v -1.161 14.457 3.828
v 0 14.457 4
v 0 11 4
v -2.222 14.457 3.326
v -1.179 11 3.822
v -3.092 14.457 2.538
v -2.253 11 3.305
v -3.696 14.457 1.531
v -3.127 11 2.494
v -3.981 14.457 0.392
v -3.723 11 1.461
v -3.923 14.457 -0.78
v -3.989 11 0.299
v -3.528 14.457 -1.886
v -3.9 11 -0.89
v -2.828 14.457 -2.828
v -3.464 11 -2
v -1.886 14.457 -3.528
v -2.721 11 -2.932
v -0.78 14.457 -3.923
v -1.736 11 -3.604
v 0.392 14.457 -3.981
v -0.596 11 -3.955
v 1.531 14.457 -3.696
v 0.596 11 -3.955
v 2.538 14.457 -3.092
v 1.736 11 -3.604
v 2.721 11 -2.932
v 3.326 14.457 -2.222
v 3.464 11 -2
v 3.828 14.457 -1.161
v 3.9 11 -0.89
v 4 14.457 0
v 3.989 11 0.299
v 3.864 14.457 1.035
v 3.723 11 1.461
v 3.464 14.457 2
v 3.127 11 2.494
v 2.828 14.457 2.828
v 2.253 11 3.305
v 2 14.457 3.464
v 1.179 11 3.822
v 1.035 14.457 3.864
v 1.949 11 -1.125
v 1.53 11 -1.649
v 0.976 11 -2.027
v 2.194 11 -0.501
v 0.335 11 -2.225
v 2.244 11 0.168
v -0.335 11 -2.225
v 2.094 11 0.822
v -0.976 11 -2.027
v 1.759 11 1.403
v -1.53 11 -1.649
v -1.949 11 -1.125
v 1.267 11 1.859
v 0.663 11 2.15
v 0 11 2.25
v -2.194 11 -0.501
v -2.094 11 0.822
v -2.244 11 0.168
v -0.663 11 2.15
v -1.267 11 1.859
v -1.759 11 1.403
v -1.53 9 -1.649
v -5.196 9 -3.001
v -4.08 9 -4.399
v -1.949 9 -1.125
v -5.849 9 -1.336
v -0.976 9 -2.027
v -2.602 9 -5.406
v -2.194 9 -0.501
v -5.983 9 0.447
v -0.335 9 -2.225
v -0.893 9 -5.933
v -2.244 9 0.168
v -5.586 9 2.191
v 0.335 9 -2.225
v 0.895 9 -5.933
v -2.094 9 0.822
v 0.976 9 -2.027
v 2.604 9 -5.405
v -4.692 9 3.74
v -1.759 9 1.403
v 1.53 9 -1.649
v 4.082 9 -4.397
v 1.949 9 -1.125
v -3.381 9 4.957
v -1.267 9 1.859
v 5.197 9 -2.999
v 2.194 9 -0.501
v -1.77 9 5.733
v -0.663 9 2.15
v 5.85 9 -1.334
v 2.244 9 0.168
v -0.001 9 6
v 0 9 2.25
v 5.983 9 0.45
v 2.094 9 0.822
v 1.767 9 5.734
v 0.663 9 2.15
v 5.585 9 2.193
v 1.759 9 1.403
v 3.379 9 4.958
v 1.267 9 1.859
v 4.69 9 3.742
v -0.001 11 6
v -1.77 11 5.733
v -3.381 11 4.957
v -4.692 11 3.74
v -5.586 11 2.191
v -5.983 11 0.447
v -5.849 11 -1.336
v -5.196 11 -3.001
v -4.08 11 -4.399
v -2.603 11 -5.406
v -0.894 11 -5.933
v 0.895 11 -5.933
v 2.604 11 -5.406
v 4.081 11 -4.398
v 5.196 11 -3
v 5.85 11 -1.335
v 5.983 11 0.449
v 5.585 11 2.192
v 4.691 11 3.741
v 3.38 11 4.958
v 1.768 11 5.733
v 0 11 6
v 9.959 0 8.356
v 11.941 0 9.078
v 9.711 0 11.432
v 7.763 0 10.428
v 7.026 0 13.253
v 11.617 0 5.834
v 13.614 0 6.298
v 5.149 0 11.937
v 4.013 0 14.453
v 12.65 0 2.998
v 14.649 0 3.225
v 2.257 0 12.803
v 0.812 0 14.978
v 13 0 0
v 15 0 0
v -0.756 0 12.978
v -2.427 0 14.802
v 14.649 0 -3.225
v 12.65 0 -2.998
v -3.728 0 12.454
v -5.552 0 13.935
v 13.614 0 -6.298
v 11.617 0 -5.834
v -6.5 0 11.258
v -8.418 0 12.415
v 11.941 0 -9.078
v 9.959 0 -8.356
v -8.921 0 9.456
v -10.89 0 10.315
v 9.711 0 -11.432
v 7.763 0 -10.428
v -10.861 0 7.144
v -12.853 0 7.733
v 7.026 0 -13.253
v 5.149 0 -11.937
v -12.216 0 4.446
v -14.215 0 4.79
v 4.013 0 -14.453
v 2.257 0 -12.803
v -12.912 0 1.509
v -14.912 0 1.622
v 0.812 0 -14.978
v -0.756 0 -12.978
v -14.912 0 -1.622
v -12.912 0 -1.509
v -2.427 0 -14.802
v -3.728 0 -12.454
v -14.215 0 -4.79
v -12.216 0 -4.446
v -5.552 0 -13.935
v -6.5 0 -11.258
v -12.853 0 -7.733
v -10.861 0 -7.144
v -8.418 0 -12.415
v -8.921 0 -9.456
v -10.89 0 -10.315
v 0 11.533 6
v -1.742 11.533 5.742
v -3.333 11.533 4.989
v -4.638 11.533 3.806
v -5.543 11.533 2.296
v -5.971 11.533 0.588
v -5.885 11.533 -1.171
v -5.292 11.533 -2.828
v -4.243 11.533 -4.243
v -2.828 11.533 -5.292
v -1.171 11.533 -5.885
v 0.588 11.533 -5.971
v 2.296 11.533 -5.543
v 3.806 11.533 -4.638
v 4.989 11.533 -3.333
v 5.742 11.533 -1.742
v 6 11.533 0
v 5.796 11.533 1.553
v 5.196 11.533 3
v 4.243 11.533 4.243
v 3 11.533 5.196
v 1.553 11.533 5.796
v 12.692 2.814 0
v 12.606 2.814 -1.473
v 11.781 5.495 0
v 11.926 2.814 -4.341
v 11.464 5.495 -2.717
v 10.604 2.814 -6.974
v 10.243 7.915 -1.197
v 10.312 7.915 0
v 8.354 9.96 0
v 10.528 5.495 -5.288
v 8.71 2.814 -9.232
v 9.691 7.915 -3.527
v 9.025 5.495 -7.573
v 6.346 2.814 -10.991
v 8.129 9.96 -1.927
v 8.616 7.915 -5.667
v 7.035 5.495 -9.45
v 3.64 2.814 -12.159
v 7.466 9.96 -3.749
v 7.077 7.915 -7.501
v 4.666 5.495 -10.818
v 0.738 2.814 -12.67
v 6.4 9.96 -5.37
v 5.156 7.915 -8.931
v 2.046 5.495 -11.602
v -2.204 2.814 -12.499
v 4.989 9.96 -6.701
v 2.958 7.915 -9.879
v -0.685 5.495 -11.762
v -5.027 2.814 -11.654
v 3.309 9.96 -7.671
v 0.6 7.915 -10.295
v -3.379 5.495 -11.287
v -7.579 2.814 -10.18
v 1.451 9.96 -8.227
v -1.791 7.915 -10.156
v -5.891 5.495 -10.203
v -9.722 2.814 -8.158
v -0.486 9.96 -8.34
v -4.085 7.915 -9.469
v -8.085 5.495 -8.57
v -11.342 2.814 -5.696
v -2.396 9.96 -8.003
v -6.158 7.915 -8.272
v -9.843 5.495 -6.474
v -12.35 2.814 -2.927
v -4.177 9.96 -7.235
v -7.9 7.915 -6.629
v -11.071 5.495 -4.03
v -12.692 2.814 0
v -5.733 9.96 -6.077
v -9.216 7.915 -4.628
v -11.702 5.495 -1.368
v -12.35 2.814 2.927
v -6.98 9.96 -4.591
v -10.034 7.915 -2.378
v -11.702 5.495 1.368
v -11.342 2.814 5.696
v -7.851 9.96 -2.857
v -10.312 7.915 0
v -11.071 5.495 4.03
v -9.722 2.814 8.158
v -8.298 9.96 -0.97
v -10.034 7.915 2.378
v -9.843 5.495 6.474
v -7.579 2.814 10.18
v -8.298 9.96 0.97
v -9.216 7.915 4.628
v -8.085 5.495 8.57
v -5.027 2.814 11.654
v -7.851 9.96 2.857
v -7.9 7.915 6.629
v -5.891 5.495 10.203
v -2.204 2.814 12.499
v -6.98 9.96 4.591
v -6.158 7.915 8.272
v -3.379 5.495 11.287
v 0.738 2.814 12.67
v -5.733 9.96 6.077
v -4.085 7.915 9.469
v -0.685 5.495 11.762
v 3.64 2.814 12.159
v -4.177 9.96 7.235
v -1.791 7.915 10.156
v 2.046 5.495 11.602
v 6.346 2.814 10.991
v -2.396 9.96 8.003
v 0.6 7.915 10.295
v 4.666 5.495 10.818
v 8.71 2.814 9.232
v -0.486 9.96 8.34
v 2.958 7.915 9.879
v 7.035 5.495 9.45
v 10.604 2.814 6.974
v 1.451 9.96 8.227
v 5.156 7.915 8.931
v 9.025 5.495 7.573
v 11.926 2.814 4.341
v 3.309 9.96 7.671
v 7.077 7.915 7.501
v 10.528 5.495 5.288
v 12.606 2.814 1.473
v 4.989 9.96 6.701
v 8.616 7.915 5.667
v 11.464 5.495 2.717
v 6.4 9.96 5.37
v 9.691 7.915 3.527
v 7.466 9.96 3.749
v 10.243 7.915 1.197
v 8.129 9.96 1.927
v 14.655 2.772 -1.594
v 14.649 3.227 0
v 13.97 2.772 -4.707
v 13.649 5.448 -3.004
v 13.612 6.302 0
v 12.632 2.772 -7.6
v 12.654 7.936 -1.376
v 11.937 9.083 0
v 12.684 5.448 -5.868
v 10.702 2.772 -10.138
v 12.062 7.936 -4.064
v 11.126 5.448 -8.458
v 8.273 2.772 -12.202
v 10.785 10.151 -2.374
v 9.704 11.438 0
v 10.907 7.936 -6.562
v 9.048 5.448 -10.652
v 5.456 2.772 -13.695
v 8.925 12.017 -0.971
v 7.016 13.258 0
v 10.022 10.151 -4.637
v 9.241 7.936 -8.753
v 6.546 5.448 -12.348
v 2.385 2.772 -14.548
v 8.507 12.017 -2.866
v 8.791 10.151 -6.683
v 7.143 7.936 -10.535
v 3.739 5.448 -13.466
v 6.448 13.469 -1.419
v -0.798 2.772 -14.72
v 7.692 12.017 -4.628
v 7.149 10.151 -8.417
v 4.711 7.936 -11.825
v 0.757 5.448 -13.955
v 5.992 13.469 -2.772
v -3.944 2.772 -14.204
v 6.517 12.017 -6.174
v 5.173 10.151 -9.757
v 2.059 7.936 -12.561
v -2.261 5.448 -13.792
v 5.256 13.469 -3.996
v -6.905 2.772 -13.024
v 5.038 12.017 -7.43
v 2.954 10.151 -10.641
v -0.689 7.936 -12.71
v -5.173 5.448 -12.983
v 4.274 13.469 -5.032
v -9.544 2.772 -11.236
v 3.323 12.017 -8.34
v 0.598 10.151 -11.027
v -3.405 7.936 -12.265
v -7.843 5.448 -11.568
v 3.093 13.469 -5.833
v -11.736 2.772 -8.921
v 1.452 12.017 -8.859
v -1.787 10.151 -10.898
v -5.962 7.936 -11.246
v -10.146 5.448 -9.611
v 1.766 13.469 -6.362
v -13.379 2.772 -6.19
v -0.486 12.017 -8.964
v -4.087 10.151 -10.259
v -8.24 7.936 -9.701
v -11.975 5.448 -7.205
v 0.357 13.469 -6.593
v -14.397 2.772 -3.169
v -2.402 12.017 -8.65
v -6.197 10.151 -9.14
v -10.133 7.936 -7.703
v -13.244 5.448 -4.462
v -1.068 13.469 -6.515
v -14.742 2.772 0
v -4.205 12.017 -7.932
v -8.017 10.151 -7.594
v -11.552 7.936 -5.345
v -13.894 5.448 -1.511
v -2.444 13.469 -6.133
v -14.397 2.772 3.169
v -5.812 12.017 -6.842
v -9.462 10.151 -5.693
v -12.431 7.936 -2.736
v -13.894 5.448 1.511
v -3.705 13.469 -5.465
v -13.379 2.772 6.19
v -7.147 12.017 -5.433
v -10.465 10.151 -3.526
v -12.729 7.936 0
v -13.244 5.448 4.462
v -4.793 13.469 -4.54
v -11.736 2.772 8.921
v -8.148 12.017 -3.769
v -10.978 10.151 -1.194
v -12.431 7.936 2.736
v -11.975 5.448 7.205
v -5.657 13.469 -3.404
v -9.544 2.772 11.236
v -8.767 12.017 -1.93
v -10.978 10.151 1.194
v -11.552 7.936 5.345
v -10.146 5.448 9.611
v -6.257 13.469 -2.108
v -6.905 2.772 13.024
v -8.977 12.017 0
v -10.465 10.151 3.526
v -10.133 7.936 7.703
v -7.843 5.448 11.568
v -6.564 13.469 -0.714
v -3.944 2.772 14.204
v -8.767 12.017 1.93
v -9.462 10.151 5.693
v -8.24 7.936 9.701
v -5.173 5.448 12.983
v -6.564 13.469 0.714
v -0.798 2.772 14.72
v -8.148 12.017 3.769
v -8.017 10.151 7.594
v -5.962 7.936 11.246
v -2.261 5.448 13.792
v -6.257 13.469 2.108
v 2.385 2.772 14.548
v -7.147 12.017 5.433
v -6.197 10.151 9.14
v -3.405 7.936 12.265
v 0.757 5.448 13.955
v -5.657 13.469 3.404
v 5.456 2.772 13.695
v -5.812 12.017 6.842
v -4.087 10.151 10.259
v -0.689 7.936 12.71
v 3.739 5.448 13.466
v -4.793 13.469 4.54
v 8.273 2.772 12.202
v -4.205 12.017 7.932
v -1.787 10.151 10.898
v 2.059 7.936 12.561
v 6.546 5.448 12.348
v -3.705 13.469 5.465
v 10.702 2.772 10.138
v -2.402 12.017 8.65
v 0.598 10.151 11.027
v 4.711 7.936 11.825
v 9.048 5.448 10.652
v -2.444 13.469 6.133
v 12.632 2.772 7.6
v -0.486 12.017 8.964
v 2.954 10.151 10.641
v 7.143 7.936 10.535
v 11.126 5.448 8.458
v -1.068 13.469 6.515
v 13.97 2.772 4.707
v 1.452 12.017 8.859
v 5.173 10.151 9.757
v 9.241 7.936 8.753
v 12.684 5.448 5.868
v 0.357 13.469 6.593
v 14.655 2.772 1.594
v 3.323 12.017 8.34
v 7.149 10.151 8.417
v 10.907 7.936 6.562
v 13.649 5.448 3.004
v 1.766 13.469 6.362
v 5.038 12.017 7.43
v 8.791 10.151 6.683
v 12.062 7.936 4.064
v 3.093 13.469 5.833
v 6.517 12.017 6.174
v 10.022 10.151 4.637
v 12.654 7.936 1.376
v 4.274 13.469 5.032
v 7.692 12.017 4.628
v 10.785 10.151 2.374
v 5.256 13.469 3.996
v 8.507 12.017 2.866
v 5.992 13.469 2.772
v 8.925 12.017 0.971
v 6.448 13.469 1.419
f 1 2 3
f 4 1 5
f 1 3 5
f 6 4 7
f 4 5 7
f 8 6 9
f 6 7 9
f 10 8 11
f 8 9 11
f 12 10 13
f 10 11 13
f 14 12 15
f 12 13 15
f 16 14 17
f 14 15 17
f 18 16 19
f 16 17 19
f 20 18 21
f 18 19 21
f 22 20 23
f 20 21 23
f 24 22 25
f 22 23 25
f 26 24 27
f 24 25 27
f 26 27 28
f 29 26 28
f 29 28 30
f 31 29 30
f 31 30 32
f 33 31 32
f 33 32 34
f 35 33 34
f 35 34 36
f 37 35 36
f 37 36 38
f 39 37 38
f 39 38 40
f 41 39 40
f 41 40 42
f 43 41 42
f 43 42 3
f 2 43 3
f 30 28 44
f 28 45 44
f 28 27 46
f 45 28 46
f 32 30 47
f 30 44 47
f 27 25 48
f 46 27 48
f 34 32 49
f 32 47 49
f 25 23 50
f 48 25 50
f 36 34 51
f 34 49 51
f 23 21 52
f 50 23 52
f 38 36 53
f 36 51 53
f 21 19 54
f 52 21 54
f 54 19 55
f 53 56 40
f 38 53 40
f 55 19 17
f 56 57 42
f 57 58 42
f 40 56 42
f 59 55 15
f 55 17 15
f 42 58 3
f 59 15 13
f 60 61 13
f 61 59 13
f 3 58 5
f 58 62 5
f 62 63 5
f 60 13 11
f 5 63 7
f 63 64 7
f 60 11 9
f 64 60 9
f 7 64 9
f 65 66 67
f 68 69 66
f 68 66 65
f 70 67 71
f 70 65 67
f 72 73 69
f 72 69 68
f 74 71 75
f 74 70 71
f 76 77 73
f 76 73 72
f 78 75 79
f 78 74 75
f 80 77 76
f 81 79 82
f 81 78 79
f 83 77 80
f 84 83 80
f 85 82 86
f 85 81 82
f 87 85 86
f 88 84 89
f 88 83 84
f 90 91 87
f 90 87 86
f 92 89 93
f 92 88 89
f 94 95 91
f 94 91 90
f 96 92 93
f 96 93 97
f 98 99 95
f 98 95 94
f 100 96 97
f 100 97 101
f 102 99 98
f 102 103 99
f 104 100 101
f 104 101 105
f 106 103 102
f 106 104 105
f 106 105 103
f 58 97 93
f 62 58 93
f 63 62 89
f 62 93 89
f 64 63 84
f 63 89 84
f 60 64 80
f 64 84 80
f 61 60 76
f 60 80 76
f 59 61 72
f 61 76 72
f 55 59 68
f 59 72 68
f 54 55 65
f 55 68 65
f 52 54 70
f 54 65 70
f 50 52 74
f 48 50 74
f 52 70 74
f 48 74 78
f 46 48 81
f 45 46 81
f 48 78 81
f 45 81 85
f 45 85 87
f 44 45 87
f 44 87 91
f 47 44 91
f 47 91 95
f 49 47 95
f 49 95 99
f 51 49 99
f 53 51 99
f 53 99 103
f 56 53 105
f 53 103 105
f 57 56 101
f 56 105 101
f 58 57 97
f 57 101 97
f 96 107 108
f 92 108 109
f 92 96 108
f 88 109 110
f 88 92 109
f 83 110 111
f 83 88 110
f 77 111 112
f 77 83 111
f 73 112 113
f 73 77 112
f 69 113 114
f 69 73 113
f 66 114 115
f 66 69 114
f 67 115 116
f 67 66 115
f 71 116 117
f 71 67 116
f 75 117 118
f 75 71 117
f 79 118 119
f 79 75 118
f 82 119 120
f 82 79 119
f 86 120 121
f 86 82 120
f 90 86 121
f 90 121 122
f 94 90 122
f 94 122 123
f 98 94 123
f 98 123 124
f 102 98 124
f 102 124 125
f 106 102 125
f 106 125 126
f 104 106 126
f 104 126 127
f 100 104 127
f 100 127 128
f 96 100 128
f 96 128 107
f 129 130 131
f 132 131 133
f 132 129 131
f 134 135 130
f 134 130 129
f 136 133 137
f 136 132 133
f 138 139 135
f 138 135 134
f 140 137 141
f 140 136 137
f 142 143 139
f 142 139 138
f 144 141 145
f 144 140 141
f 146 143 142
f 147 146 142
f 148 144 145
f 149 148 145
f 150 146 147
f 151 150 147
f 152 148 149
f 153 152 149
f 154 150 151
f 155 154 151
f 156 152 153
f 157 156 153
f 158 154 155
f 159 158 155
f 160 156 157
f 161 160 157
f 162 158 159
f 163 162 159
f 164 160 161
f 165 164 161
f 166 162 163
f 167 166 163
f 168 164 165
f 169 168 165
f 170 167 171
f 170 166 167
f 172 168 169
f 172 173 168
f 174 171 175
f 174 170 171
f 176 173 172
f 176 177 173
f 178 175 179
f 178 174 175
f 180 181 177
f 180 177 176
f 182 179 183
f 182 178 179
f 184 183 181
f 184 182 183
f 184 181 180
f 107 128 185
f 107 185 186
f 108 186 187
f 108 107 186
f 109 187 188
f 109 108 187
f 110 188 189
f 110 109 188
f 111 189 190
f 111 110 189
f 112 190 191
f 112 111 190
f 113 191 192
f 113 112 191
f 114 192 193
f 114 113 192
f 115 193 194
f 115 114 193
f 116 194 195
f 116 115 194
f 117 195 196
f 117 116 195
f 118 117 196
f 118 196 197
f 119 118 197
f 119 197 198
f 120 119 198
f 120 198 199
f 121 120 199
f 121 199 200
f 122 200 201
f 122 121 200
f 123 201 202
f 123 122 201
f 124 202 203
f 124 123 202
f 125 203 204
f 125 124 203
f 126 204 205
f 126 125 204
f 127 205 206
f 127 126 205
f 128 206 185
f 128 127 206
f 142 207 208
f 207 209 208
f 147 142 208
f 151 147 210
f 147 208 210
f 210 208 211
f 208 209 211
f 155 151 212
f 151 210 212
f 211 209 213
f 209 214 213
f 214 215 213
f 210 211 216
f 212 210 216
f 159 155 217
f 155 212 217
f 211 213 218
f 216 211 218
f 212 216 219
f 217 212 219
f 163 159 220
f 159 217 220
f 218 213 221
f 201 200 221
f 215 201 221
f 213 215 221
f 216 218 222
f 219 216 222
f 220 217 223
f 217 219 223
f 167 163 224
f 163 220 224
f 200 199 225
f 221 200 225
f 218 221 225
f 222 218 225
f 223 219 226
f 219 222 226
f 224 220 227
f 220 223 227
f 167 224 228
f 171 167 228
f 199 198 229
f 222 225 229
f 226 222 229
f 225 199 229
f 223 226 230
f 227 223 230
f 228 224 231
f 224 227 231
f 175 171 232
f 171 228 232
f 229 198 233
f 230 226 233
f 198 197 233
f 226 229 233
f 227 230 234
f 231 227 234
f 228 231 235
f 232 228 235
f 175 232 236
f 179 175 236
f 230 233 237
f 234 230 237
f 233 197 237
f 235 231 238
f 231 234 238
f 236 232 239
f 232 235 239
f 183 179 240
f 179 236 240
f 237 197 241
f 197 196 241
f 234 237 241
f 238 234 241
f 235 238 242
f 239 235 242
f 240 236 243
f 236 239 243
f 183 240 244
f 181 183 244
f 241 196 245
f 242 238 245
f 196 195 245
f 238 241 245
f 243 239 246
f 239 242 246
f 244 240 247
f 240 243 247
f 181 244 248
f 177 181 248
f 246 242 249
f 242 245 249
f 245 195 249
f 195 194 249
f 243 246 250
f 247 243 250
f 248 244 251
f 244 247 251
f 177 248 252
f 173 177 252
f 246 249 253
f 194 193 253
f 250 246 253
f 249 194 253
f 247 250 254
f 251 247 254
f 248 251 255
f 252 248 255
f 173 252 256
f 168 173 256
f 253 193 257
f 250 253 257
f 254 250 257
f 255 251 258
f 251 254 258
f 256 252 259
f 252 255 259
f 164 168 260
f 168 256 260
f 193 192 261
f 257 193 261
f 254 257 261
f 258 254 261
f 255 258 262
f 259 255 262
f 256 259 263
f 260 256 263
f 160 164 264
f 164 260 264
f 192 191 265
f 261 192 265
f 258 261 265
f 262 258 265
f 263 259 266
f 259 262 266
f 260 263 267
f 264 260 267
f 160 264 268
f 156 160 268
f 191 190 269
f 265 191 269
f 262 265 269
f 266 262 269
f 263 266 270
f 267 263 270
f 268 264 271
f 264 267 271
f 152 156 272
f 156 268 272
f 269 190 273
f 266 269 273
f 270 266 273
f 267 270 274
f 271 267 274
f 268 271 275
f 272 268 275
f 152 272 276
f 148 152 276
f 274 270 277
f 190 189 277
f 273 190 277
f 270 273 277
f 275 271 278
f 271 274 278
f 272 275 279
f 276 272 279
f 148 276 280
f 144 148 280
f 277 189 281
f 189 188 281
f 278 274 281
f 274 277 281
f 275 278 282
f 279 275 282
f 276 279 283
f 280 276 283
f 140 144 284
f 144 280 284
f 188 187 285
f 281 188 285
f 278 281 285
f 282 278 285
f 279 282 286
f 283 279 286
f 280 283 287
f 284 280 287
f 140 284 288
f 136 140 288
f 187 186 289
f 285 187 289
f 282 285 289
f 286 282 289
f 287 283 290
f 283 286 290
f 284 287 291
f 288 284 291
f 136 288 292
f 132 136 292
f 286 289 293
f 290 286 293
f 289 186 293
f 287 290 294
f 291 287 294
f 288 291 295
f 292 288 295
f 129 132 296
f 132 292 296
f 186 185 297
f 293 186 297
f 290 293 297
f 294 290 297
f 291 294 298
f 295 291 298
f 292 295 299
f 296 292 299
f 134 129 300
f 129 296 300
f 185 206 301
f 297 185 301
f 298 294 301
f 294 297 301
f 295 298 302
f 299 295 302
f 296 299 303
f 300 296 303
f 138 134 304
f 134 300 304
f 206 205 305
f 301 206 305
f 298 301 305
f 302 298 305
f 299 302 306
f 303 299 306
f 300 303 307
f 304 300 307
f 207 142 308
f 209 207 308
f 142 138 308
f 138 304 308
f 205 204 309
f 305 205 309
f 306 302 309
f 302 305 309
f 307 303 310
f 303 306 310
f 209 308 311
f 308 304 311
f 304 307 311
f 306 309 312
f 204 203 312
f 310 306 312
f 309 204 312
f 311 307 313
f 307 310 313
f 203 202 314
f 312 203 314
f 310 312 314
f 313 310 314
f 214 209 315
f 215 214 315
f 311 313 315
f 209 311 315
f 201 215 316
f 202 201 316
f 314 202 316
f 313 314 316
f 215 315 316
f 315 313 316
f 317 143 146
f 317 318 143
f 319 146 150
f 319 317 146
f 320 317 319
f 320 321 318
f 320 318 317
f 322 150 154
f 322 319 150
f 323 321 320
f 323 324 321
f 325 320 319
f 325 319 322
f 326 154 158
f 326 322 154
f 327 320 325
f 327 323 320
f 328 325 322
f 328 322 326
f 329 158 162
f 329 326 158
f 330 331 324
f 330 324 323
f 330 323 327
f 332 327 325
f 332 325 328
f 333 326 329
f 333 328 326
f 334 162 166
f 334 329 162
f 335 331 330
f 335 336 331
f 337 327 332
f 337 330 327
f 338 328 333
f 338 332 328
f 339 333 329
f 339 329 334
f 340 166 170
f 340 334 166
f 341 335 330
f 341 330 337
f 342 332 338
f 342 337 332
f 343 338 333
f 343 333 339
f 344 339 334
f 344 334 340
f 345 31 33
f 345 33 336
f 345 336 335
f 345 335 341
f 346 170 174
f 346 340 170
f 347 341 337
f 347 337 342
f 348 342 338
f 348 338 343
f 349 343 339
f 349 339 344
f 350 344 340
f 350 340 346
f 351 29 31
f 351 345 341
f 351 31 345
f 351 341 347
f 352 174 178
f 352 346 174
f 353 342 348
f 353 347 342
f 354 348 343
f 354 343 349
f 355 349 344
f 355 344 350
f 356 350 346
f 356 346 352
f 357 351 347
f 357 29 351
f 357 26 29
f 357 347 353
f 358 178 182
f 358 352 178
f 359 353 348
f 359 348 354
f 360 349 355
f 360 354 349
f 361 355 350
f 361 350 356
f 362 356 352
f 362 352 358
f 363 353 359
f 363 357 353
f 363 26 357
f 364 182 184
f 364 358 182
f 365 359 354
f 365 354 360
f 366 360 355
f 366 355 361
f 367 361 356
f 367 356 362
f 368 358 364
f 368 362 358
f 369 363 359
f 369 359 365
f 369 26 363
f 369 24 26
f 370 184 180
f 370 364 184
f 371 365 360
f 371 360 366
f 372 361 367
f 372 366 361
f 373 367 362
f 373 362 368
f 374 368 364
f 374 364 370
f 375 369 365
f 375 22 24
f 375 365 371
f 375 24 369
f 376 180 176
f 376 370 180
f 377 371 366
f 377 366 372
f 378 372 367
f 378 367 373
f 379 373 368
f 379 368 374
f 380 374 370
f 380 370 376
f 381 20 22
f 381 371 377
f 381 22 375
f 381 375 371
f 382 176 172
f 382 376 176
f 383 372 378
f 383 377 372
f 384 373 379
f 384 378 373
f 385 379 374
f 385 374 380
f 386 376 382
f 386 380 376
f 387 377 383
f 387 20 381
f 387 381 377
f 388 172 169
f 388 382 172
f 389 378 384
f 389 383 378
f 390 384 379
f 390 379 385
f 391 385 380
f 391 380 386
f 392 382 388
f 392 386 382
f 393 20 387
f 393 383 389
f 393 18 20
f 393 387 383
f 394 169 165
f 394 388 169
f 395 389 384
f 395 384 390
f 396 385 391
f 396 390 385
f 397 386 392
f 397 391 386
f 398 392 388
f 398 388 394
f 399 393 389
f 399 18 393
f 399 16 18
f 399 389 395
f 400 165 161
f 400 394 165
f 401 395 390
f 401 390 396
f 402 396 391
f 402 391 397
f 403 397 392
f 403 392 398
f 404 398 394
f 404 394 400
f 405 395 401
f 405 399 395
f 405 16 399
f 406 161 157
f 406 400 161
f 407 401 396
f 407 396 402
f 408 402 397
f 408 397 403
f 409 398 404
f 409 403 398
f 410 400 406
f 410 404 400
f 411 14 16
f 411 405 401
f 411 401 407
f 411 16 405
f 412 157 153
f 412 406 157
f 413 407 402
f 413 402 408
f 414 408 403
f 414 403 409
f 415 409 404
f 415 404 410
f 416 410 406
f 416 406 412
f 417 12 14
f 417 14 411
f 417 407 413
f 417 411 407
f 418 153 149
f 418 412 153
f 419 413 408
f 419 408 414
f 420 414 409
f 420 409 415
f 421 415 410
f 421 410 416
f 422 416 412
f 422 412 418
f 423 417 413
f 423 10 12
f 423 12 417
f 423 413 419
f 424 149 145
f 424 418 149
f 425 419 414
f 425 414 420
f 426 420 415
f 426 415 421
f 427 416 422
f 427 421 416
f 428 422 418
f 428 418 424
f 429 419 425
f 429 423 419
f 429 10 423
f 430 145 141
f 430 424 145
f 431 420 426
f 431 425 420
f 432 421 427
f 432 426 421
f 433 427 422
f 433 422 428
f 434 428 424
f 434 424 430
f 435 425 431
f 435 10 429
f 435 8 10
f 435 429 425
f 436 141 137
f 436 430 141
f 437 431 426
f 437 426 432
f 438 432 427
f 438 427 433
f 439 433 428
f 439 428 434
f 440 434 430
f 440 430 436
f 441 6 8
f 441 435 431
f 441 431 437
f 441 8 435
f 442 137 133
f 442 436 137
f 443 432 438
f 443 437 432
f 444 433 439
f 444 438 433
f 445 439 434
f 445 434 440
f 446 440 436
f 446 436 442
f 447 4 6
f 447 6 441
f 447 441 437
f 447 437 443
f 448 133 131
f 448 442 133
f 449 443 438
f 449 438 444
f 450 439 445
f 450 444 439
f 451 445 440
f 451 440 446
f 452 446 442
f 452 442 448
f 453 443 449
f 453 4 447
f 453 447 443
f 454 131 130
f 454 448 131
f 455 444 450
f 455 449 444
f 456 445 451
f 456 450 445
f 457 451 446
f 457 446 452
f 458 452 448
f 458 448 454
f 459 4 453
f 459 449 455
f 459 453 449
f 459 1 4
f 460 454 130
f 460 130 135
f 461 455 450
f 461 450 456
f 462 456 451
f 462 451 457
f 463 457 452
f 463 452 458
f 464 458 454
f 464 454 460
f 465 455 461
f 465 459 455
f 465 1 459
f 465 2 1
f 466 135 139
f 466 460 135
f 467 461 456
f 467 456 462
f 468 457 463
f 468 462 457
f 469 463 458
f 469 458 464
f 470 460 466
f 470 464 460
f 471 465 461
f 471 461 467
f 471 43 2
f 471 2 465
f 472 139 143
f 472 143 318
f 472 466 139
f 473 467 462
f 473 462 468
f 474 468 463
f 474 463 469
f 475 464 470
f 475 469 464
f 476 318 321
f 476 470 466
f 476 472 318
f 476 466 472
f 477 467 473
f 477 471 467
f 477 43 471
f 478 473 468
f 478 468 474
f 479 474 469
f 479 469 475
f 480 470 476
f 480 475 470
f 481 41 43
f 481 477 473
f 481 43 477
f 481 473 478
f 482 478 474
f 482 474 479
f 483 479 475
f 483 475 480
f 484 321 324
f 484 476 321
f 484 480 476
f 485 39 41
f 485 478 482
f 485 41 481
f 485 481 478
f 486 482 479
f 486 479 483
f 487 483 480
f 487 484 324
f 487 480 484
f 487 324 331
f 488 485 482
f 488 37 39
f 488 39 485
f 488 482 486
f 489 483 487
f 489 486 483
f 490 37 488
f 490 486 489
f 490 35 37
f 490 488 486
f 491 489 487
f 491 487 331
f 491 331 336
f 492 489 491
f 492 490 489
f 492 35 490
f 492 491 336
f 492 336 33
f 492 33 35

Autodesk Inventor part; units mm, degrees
ref_plane "YZ Plane" through (0, 0, 0) normal (1, 0, 0) x (0, 1, 0)
ref_plane "XY Plane" through (0, 0, 0) normal (0, 0, 1) x (1, 0, 0)
sketch "Sketch1" plane through (0, 0, 0) normal (0, 0, 1) x (1, 0, 0)
  line L0 (0, 0) -> (0, 15)
  line L1 (0, 0) -> (15, 0)
  arc A0 (15, 0) -> (0, 15) centre (0, 0) ccw
  line L2 (0, -3.6213) -> (0, 21.7279) projected
  dimension "d2" = 15
revolve "Revolution1" add sketch "Sketch1" angle 360 about axis through (0, -10, 0) along (0, 1, 0)
ref_plane "Work Plane1" through (0, 15, 0) normal (0, 1, 0) x (-1, 0, 0)
sketch "Sketch2" plane through (0, 15, 0) normal (0, 1, 0) x (-1, 0, 0)
  point P0 (0, 0)
  point P1 (0, 0)
hole "Hole1" at (0, 15, 0) direction (0, -1, 0) diameter 4.5 end through all counterbore diameter 8 counterbore depth 4 clearance for "Socket Head Cap Screw" size "M4" standard "Ansi Metric M Profile"
shell "Shell1" thickness 2 removed faces 1 at (10.5992, 0, 1.287)
sketch "Sketch3" plane through (0, 0, 0) normal (0, -1, 0) x (1, 0, 0)
  circle A0 centre (0, 0) radius 4.25 projected
  circle A1 centre (0, 0) radius 2.25 projected
extrude "Extrusion1" cut sketch "Sketch3" against normal blind 9
properties part number "Ball_Upper Half" material "Nylon 6/6"
